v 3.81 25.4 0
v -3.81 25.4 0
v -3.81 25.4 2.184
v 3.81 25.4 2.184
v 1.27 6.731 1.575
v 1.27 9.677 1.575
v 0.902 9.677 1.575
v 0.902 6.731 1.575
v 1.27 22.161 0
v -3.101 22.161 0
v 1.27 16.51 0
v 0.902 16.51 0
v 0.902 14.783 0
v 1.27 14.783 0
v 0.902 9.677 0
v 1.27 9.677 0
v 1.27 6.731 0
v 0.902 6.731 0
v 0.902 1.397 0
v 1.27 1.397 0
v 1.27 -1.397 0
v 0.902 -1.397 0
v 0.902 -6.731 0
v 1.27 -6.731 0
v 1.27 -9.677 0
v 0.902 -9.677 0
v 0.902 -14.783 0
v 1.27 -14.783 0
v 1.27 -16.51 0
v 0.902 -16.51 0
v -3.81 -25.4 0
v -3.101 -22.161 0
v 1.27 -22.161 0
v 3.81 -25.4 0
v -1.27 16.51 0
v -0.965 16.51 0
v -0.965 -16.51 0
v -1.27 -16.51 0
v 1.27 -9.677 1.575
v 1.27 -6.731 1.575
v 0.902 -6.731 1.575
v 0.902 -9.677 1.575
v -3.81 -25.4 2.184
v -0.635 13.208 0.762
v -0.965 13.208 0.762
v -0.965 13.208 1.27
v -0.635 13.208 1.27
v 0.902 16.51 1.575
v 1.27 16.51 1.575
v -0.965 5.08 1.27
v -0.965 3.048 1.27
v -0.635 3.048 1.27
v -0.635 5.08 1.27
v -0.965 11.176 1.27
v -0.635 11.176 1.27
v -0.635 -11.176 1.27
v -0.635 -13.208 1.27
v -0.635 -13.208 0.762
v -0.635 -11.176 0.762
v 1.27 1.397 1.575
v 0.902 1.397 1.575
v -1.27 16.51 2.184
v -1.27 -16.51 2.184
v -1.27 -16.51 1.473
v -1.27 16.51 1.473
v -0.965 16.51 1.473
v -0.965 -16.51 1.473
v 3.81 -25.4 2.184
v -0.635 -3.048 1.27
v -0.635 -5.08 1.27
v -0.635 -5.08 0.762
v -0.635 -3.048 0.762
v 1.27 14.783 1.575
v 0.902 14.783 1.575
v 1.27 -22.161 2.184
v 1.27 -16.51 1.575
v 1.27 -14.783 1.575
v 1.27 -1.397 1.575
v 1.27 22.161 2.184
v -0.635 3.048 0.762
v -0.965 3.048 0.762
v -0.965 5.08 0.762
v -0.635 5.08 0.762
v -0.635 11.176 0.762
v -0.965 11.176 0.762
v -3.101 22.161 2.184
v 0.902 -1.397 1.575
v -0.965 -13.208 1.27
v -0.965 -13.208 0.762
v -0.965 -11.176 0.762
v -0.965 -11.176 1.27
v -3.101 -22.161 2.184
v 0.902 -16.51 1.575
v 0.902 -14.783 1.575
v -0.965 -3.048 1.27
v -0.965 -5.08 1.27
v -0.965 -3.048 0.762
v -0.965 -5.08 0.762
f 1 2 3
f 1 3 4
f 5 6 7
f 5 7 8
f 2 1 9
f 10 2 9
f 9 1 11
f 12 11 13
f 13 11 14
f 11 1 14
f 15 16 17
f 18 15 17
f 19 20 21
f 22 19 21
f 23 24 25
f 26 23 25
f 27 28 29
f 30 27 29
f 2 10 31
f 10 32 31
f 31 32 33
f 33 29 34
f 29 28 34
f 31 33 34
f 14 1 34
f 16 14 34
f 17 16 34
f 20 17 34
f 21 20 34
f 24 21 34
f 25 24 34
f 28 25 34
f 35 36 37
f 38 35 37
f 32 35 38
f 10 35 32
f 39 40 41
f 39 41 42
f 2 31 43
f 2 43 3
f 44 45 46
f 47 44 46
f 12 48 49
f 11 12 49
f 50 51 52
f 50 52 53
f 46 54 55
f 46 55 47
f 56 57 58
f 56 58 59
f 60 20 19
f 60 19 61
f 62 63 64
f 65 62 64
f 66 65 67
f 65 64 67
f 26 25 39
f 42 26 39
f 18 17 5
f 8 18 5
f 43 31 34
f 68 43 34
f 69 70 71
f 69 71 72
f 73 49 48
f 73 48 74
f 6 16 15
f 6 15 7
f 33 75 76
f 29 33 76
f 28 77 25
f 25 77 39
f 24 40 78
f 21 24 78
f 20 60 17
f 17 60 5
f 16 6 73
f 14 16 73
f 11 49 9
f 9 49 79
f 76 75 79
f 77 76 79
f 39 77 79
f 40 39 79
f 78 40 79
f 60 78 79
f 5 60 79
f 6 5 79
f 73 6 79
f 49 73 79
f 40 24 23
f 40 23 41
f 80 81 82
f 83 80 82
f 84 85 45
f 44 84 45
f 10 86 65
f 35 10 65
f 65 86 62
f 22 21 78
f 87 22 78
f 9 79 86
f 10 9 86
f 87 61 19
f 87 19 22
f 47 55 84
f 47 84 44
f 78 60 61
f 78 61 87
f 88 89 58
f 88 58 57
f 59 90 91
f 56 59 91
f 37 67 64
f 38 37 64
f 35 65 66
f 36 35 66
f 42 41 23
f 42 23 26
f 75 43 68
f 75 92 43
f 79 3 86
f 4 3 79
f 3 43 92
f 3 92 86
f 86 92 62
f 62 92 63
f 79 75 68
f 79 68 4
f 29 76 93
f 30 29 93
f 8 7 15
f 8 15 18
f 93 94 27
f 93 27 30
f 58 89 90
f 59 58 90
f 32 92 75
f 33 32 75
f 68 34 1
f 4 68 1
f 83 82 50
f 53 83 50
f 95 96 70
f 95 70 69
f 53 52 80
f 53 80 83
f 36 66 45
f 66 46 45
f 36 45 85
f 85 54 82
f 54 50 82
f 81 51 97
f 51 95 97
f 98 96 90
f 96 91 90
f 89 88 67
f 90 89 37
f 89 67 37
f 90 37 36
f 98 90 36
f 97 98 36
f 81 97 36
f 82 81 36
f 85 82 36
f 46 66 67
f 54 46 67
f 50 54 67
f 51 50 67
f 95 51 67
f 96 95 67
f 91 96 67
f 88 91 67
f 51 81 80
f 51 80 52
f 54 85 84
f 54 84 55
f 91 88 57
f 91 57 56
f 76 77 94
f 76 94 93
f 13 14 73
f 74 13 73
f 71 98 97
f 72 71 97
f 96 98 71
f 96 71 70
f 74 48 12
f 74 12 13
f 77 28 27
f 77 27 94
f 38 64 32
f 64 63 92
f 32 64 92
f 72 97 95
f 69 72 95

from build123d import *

# Parameters (mm, degrees)
F0_W     = 7.62
F0_H     = 50.8
F1_DEPTH = 2.1844
F3_DEPTH = 16.51
F4_W     = 2.794
F4_H     = 1.5748
F4_W_2   = 2.9464
F4_W_3   = 1.7272
F5_DEPTH = 0.3683
F6_W     = 2.032
F6_H     = 0.508
F7_DEPTH = 0.3302
F9_DEPTH = 25.4


with BuildPart() as f1:
    # F0 (on Top) → F1 (new body)
    with BuildSketch(Plane.XY):
        Rectangle(F0_W, F0_H)
    extrude(amount=F1_DEPTH)

    # F2 (on Front) → F3 (cut, symmetric)
    with BuildSketch(Plane.XZ):
        Polygon((-0.9652, 0), (1.27, 0), (1.27, 2.1844), (-1.27, 2.1844), (-1.27, 1.4732), (-0.9652, 1.4732), align=None)
    extrude(amount=F3_DEPTH, both=True, mode=Mode.SUBTRACT)

    # F4 (on face) → F5 (join)
    with BuildSketch(Plane(origin=(1.27, 0, 0), x_dir=(0, -1, 0), z_dir=(-1, 0, 0))):
        with Locations((0, 0.7874)):
            Rectangle(F4_W, F4_H)
        with Locations((-8.2042, 0.7874)):
            Rectangle(F4_W_2, F4_H)
        with Locations((8.2042, 0.7874)):
            Rectangle(F4_W_2, F4_H)
        with Locations((-15.6464, 0.7874)):
            Rectangle(F4_W_3, F4_H)
        with Locations((15.6464, 0.7874)):
            Rectangle(F4_W_3, F4_H)
    extrude(amount=F5_DEPTH)

    # F6 (on face) → F7 (join)
    with BuildSketch(Plane.YZ.offset(-0.9652)):
        with Locations((-4.064, 1.016)):
            Rectangle(F6_W, F6_H)
        with Locations((4.064, 1.016)):
            Rectangle(F6_W, F6_H)
        with Locations((-12.192, 1.016)):
            Rectangle(F6_W, F6_H)
        with Locations((12.192, 1.016)):
            Rectangle(F6_W, F6_H)
    extrude(amount=F7_DEPTH)

    # F8 (on face) → F9 (cut)
    with BuildSketch(Plane.XY.offset(2.1844)):
        Polygon((-3.100628, 22.160923), (-1.27, 16.51), (1.27, 16.51), (1.27, 22.160923), align=None)
        Polygon((1.27, -16.51), (-1.27, -16.51), (-3.100628, -22.160923), (1.27, -22.160923), align=None)
    extrude(amount=-F9_DEPTH, mode=Mode.SUBTRACT)


with BuildPart() as f10_1:
    # F10: copy of F1
    add(f1.part.moved(Location((7.62, 0, 0))))


with BuildPart() as f11_1:
    # F11: copy of F10_1
    add(f10_1.part.moved(Location((7.62, 0, 0))))


with BuildPart() as f12_1:
    # F12: copy of F11_1
    add(f11_1.part.moved(Location((7.62, 0, 0))))


solid = f1.part
